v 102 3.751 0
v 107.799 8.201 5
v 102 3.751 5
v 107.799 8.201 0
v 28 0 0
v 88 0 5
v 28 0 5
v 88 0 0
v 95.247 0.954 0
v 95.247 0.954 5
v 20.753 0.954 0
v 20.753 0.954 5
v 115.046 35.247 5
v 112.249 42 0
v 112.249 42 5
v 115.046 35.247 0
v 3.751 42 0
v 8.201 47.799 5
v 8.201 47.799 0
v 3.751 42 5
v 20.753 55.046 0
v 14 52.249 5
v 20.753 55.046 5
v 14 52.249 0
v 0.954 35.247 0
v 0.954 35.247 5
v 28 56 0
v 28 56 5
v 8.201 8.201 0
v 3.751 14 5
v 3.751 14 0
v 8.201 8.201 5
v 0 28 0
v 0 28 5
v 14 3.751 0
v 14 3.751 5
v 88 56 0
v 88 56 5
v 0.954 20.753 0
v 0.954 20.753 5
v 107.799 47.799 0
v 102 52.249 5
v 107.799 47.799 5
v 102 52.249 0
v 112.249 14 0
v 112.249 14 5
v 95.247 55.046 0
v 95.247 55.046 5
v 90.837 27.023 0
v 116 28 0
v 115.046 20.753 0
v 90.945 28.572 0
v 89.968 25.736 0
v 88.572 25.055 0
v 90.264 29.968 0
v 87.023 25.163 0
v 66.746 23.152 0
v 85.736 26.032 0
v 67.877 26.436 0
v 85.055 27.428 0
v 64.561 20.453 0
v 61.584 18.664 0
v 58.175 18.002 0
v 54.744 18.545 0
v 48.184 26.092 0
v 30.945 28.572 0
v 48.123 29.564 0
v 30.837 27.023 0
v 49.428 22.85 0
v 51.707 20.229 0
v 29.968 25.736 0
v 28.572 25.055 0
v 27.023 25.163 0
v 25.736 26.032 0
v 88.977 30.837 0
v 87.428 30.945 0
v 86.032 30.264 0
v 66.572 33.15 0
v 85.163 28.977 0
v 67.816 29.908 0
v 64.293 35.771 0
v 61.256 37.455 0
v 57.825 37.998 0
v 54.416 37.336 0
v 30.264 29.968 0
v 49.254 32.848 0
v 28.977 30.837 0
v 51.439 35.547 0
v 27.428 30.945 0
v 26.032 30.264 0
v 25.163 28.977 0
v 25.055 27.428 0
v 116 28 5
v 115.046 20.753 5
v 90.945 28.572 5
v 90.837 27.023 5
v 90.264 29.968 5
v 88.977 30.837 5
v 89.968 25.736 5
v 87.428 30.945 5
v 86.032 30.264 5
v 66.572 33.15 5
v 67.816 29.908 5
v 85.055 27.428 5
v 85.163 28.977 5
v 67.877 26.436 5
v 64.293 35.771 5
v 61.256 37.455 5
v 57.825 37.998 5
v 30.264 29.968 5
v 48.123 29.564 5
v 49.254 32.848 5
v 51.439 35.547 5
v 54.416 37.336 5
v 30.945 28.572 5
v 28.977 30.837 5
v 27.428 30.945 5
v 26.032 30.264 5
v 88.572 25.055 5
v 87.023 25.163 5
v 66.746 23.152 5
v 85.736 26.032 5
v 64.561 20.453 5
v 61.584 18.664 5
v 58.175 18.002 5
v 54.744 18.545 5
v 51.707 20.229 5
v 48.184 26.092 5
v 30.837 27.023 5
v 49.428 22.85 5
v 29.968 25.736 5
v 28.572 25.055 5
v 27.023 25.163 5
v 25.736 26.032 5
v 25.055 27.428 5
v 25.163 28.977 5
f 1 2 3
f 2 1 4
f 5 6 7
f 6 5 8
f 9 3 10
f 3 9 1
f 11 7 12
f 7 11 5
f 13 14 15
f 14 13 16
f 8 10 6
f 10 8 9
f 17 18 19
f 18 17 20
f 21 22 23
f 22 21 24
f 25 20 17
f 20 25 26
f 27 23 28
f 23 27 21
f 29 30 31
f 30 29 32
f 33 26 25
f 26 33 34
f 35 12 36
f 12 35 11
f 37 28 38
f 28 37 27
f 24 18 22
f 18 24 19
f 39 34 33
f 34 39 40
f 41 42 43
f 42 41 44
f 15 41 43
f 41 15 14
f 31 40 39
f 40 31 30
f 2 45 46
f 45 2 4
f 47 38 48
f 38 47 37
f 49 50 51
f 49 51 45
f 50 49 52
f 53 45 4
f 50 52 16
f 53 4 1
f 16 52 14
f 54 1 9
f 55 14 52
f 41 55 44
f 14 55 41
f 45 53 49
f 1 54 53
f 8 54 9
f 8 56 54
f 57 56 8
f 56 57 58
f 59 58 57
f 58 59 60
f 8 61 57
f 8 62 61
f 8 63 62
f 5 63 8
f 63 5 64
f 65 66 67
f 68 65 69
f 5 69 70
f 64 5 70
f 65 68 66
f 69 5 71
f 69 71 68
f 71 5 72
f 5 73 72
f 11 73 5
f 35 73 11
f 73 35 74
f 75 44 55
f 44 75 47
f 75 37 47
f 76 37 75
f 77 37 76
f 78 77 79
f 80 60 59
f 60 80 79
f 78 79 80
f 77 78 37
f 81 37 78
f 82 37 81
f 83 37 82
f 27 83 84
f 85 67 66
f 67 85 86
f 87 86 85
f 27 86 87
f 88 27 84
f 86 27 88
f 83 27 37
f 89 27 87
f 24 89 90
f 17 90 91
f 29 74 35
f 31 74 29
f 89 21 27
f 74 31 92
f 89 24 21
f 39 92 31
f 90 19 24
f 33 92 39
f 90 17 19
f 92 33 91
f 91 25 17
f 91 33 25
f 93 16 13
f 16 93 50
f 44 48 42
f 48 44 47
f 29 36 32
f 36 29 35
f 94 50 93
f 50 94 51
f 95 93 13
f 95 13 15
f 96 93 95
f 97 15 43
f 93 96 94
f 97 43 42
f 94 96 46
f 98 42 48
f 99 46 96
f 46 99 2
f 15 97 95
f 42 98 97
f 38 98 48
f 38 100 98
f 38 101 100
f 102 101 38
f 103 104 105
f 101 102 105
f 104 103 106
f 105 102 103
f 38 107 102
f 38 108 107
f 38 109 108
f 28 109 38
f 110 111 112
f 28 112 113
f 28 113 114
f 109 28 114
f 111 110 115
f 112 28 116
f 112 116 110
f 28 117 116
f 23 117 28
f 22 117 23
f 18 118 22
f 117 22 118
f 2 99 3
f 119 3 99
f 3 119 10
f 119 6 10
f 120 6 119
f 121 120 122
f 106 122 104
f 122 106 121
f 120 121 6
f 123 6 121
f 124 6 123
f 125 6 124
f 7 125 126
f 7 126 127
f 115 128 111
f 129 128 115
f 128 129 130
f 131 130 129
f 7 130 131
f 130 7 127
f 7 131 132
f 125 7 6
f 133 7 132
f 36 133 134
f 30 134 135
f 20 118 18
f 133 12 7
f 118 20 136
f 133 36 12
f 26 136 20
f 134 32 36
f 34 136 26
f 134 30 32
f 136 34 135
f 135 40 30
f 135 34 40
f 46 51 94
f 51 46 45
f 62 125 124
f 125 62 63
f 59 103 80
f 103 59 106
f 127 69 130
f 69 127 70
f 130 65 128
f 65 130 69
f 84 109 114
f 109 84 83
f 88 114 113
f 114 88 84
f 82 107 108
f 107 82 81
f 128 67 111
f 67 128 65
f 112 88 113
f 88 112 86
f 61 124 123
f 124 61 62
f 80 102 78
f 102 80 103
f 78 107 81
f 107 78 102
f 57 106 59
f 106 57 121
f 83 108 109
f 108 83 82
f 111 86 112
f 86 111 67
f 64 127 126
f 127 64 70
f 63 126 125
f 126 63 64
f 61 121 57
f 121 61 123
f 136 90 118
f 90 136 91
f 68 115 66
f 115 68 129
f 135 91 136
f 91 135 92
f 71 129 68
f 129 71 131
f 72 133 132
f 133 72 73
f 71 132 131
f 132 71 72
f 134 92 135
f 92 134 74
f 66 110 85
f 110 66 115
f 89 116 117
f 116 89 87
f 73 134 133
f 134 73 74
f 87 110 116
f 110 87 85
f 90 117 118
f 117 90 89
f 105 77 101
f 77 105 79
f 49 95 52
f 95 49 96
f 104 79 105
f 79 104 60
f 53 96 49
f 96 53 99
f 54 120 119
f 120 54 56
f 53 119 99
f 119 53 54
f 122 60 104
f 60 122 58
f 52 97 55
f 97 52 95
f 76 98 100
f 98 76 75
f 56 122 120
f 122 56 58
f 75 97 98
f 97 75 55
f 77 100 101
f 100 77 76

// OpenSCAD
$fn = 32;

// ----------------------------------------------------------------------
// Spacer plate: obround span 60, caps R28
// ----------------------------------------------------------------------

// --- parameters (mm) ---
bore_r = 10;              // centre bore radius
bolt_r = 3;               // bolt hole radius
plate_t = 5;              // plate thickness, Z (extrusion height)
span = 60;                // obround span
cap_r = 28;               // cap radius

profile = [[28, 56], [20.753, 55.046], [14, 52.249], [8.201, 47.799], [3.751, 42], [0.954, 35.247], [0, 28], [0.954, 20.753], [3.751, 14], [8.201, 8.201], [14, 3.751], [20.753, 0.954], [28, 0], [88, 0], [95.247, 0.954], [102, 3.751], [107.799, 8.201], [112.249, 14], [115.046, 20.753], [116, 28], [115.046, 35.247], [112.249, 42], [107.799, 47.799], [102, 52.249], [95.247, 55.046], [88, 56]];  // primary outline, 26 points, counter clockwise
void_1 = [[67.816, 29.908], [66.572, 33.15], [64.293, 35.771], [61.256, 37.455], [57.825, 37.998], [54.416, 37.336], [51.439, 35.547], [49.254, 32.848], [48.123, 29.564], [48.184, 26.092], [49.428, 22.85], [51.707, 20.229], [54.744, 18.545], [58.175, 18.002], [61.584, 18.664], [64.561, 20.453], [66.746, 23.152], [67.877, 26.436]];  // centre bore, 18 points
void_2 = [[30.945, 28.572], [30.264, 29.968], [28.977, 30.837], [27.428, 30.945], [26.032, 30.264], [25.163, 28.977], [25.055, 27.428], [25.736, 26.032], [27.023, 25.163], [28.572, 25.055], [29.968, 25.736], [30.837, 27.023]];  // end hole, 12 points
void_3 = [[90.945, 28.572], [90.264, 29.968], [88.977, 30.837], [87.428, 30.945], [86.032, 30.264], [85.163, 28.977], [85.055, 27.428], [85.736, 26.032], [87.023, 25.163], [88.572, 25.055], [89.968, 25.736], [90.837, 27.023]];  // end hole, 12 points

// --- the one profile operation ---
difference() {
  linear_extrude(height = plate_t) polygon(points = profile);
  translate([0, 0, -1])
    linear_extrude(height = plate_t + 2) polygon(points = void_1);
  translate([0, 0, -1])
    linear_extrude(height = plate_t + 2) polygon(points = void_2);
  translate([0, 0, -1])
    linear_extrude(height = plate_t + 2) polygon(points = void_3);
}
